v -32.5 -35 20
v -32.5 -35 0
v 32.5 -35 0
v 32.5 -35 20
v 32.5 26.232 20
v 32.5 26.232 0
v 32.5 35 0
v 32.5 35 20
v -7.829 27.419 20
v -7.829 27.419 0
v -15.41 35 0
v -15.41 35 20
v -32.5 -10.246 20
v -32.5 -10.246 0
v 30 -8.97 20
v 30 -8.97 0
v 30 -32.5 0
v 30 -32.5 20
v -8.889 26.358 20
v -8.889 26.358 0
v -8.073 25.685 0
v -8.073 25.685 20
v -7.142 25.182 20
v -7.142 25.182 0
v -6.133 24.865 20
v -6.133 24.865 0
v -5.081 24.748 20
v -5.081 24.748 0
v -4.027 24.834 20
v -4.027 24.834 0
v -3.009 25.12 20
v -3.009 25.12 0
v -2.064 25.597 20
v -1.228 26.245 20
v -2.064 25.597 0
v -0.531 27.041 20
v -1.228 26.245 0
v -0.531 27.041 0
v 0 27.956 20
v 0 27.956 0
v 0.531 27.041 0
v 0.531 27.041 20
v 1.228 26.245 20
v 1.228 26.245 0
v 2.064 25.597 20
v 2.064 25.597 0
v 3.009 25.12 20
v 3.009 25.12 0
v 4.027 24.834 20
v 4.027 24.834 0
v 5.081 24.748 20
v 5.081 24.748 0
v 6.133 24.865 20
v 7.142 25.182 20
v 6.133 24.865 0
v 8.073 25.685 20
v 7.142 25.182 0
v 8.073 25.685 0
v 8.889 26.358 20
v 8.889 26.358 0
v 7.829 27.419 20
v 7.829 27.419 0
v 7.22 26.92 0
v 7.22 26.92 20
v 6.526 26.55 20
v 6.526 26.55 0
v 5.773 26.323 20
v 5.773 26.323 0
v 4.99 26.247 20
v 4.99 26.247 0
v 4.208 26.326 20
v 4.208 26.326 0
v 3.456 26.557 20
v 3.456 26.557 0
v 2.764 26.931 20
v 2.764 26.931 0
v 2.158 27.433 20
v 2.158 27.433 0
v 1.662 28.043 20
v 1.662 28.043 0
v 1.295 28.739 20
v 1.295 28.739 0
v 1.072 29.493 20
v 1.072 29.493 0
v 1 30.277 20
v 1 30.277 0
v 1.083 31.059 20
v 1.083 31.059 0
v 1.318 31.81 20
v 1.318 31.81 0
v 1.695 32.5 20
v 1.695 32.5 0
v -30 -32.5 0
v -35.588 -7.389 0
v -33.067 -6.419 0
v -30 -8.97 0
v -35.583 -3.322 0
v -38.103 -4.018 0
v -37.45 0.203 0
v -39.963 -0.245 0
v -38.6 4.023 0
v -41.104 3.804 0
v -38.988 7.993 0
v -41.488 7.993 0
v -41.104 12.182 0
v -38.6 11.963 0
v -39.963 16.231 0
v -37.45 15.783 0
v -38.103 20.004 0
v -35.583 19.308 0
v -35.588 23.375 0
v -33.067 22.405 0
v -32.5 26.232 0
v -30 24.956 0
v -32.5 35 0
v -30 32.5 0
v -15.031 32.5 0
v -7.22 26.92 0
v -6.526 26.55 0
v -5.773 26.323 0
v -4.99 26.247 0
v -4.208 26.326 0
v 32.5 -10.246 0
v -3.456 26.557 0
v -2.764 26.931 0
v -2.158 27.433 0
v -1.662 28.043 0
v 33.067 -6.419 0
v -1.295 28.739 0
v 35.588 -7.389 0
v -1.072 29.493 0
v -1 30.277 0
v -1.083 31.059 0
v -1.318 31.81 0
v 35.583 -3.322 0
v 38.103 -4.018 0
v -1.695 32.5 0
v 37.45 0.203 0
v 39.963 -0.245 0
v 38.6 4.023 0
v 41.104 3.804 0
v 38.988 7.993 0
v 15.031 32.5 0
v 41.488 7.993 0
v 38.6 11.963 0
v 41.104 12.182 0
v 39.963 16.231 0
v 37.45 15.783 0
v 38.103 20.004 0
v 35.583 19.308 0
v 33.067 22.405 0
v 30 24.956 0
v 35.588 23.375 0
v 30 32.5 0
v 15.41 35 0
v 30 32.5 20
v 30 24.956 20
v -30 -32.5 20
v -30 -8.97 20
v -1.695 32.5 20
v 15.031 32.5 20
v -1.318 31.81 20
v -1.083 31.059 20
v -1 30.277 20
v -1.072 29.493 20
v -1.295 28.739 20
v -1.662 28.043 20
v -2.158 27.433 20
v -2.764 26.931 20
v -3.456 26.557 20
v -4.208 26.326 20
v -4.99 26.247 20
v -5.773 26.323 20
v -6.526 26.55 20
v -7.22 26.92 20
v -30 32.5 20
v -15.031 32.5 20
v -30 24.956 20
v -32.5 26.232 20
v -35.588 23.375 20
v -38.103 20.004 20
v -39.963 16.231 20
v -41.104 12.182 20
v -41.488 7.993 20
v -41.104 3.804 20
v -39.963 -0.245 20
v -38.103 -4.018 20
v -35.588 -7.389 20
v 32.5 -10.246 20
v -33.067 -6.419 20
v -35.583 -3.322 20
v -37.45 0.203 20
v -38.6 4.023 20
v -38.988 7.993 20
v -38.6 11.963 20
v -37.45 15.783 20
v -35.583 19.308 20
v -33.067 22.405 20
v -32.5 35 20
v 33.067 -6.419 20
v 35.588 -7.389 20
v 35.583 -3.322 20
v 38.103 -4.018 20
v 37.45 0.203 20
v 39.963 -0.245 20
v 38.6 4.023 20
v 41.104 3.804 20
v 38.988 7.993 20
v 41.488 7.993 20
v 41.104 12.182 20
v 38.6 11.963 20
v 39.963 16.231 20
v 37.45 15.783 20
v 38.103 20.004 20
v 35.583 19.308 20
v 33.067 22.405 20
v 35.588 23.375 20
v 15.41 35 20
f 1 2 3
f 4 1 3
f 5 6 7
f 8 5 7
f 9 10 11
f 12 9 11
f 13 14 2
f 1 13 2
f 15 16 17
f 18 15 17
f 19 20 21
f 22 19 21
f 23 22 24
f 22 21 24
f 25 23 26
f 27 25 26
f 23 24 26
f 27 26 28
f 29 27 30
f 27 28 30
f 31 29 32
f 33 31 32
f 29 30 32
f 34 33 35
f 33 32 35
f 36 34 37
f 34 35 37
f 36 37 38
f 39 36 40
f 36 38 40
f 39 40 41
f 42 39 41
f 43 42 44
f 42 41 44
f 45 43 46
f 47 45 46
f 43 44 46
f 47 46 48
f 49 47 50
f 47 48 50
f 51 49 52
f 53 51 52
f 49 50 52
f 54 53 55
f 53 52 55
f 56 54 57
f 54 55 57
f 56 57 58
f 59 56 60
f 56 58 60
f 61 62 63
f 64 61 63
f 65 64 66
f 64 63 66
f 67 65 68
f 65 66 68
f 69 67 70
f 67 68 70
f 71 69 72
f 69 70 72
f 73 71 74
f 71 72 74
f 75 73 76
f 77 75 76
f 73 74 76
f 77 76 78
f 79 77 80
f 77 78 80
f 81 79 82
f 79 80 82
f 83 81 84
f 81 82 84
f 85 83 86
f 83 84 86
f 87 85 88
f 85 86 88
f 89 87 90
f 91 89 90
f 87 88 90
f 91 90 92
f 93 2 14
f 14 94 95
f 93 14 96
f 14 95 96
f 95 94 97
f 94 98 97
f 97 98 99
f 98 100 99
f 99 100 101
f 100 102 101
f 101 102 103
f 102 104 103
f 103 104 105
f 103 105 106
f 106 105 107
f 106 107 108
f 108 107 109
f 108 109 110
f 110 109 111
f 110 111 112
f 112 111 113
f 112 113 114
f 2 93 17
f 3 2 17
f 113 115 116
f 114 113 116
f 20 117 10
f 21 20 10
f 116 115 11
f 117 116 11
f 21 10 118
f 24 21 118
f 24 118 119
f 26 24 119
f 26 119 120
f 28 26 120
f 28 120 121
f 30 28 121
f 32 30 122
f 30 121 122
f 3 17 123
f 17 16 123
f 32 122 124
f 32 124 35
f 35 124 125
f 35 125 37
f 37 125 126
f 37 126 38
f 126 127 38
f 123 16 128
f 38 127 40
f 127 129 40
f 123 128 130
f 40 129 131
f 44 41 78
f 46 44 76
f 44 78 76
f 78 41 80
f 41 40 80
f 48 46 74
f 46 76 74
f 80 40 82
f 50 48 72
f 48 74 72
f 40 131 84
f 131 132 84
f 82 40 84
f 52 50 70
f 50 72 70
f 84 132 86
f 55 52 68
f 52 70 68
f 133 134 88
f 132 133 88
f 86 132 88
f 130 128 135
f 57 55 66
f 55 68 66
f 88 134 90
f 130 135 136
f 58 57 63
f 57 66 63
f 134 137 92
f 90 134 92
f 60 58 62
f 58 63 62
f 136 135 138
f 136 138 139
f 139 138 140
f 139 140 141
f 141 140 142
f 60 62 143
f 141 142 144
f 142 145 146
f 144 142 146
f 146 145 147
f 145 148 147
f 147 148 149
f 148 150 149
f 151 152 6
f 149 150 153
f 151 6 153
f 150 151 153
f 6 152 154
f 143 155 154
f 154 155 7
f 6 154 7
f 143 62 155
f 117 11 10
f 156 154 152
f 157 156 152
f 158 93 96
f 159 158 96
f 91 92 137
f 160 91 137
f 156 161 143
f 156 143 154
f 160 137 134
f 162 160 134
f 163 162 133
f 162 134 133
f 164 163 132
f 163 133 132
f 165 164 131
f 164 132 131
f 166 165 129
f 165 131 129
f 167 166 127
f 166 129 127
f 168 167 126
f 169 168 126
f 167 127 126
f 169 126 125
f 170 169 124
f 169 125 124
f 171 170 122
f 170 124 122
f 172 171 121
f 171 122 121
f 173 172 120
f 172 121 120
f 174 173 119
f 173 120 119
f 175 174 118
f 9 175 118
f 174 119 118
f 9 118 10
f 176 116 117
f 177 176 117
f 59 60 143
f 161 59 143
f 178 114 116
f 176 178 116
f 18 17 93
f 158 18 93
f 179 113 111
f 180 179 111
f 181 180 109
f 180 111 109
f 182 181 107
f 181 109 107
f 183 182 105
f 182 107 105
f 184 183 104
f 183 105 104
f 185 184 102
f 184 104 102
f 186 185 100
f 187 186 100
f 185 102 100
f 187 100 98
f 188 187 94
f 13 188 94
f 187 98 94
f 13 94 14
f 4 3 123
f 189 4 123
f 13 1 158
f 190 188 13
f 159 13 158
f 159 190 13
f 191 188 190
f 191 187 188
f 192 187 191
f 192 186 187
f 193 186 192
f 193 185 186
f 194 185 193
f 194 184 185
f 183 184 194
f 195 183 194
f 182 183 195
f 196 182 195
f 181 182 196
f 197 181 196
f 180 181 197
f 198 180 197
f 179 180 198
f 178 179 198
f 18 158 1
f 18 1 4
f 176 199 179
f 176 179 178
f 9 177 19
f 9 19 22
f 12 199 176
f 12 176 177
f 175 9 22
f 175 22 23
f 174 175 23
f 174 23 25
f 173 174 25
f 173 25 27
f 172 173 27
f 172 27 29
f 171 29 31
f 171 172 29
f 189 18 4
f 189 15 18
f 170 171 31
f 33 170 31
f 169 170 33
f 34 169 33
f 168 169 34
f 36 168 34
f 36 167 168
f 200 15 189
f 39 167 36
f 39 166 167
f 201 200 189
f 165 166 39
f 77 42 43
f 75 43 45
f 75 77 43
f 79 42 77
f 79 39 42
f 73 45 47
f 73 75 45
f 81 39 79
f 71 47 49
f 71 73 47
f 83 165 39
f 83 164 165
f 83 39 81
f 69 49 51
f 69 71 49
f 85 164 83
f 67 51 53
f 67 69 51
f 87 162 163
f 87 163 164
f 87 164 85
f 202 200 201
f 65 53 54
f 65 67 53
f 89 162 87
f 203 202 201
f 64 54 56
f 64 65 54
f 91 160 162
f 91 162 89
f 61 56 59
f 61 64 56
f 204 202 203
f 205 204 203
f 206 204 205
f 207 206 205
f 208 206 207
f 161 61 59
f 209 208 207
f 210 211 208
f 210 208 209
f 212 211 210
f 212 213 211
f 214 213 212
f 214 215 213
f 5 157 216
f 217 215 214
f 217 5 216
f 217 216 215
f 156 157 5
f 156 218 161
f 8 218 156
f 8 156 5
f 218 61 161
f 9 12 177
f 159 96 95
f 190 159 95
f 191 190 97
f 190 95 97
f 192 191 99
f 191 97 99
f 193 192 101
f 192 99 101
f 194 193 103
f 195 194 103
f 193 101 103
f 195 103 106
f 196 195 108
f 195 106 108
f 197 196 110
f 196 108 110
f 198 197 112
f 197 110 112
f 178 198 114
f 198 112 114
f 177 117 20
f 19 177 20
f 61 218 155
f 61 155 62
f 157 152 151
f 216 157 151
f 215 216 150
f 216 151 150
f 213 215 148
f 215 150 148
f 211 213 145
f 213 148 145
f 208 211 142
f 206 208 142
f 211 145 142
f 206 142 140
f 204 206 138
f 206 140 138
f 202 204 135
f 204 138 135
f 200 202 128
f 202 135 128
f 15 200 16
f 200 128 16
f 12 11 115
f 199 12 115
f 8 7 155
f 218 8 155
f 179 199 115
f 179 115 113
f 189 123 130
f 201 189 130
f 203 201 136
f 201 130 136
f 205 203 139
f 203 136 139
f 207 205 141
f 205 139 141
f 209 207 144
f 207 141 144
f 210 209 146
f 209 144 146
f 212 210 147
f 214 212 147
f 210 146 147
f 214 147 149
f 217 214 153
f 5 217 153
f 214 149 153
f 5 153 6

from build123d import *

# Parameters (mm, degrees)
AUFSATZ_LINEAR_AUSTRAGEN1_DEPTH = 20


with BuildPart() as part:
    # Skizze1 → Aufsatz-Linear austragen1 (new body)
    with BuildSketch(Plane.XY):
        with BuildLine():
            ThreePointArc((32.5, -10.246334318), (41.488350442, 7.993009877), (32.5, 26.232354072))
            Line((32.5, 26.232354072), (32.5, 35))
            Line((32.5, 35), (15.409785503, 35))
            Line((15.409785503, 35), (7.828556273, 27.418770769))
            ThreePointArc((7.828556273, 27.41877077), (2.44835133, 27.166868372), (1.69484812, 32.5))
            Line((1.69484812, 32.5), (-1.69484812, 32.5))
            ThreePointArc((-1.69484812, 32.5), (-2.44835133, 27.166868372), (-7.828556273, 27.41877077))
            Line((-7.828556273, 27.418770769), (-15.409785503, 35))
            Line((-15.409785503, 35), (-32.5, 35))
            Line((-32.5, 35), (-32.5, 26.232354072))
            ThreePointArc((-32.5, 26.232354072), (-41.488350442, 7.993009877), (-32.5, -10.246334318))
            Line((-32.5, -10.246334318), (-32.5, -35))
            Line((-32.5, -35), (32.5, -35))
            Line((32.5, -35), (32.5, -10.246334318))
        make_face()
        with BuildLine():
            Line((30, 32.5), (30, 24.955672535))
            ThreePointArc((30, 24.955672535), (38.988350442, 7.993009877), (30, -8.969652782))
            Line((30, -8.969652782), (30, -32.5))
            Line((30, -32.5), (-30, -32.5))
            Line((-30, -32.5), (-30, -8.969652782))
            ThreePointArc((-30, -8.969652782), (-38.988350442, 7.993009877), (-30, 24.955672535))
            Line((-30, 24.955672535), (-30, 32.5))
            Line((-30, 32.5), (-15.031105847, 32.5))
            Line((-15.031105847, 32.5), (-8.889216445, 26.358110598))
            ThreePointArc((-8.889216445, 26.358110598), (-4.026954213, 24.833979762), (0, 27.956191892))
            ThreePointArc((0, 27.956191892), (4.026954213, 24.833979762), (8.889216445, 26.358110598))
            Line((8.889216445, 26.358110598), (15.031105847, 32.5))
            Line((15.031105847, 32.5), (30, 32.5))
        make_face(mode=Mode.SUBTRACT)
    extrude(amount=AUFSATZ_LINEAR_AUSTRAGEN1_DEPTH)


solid = part.part
